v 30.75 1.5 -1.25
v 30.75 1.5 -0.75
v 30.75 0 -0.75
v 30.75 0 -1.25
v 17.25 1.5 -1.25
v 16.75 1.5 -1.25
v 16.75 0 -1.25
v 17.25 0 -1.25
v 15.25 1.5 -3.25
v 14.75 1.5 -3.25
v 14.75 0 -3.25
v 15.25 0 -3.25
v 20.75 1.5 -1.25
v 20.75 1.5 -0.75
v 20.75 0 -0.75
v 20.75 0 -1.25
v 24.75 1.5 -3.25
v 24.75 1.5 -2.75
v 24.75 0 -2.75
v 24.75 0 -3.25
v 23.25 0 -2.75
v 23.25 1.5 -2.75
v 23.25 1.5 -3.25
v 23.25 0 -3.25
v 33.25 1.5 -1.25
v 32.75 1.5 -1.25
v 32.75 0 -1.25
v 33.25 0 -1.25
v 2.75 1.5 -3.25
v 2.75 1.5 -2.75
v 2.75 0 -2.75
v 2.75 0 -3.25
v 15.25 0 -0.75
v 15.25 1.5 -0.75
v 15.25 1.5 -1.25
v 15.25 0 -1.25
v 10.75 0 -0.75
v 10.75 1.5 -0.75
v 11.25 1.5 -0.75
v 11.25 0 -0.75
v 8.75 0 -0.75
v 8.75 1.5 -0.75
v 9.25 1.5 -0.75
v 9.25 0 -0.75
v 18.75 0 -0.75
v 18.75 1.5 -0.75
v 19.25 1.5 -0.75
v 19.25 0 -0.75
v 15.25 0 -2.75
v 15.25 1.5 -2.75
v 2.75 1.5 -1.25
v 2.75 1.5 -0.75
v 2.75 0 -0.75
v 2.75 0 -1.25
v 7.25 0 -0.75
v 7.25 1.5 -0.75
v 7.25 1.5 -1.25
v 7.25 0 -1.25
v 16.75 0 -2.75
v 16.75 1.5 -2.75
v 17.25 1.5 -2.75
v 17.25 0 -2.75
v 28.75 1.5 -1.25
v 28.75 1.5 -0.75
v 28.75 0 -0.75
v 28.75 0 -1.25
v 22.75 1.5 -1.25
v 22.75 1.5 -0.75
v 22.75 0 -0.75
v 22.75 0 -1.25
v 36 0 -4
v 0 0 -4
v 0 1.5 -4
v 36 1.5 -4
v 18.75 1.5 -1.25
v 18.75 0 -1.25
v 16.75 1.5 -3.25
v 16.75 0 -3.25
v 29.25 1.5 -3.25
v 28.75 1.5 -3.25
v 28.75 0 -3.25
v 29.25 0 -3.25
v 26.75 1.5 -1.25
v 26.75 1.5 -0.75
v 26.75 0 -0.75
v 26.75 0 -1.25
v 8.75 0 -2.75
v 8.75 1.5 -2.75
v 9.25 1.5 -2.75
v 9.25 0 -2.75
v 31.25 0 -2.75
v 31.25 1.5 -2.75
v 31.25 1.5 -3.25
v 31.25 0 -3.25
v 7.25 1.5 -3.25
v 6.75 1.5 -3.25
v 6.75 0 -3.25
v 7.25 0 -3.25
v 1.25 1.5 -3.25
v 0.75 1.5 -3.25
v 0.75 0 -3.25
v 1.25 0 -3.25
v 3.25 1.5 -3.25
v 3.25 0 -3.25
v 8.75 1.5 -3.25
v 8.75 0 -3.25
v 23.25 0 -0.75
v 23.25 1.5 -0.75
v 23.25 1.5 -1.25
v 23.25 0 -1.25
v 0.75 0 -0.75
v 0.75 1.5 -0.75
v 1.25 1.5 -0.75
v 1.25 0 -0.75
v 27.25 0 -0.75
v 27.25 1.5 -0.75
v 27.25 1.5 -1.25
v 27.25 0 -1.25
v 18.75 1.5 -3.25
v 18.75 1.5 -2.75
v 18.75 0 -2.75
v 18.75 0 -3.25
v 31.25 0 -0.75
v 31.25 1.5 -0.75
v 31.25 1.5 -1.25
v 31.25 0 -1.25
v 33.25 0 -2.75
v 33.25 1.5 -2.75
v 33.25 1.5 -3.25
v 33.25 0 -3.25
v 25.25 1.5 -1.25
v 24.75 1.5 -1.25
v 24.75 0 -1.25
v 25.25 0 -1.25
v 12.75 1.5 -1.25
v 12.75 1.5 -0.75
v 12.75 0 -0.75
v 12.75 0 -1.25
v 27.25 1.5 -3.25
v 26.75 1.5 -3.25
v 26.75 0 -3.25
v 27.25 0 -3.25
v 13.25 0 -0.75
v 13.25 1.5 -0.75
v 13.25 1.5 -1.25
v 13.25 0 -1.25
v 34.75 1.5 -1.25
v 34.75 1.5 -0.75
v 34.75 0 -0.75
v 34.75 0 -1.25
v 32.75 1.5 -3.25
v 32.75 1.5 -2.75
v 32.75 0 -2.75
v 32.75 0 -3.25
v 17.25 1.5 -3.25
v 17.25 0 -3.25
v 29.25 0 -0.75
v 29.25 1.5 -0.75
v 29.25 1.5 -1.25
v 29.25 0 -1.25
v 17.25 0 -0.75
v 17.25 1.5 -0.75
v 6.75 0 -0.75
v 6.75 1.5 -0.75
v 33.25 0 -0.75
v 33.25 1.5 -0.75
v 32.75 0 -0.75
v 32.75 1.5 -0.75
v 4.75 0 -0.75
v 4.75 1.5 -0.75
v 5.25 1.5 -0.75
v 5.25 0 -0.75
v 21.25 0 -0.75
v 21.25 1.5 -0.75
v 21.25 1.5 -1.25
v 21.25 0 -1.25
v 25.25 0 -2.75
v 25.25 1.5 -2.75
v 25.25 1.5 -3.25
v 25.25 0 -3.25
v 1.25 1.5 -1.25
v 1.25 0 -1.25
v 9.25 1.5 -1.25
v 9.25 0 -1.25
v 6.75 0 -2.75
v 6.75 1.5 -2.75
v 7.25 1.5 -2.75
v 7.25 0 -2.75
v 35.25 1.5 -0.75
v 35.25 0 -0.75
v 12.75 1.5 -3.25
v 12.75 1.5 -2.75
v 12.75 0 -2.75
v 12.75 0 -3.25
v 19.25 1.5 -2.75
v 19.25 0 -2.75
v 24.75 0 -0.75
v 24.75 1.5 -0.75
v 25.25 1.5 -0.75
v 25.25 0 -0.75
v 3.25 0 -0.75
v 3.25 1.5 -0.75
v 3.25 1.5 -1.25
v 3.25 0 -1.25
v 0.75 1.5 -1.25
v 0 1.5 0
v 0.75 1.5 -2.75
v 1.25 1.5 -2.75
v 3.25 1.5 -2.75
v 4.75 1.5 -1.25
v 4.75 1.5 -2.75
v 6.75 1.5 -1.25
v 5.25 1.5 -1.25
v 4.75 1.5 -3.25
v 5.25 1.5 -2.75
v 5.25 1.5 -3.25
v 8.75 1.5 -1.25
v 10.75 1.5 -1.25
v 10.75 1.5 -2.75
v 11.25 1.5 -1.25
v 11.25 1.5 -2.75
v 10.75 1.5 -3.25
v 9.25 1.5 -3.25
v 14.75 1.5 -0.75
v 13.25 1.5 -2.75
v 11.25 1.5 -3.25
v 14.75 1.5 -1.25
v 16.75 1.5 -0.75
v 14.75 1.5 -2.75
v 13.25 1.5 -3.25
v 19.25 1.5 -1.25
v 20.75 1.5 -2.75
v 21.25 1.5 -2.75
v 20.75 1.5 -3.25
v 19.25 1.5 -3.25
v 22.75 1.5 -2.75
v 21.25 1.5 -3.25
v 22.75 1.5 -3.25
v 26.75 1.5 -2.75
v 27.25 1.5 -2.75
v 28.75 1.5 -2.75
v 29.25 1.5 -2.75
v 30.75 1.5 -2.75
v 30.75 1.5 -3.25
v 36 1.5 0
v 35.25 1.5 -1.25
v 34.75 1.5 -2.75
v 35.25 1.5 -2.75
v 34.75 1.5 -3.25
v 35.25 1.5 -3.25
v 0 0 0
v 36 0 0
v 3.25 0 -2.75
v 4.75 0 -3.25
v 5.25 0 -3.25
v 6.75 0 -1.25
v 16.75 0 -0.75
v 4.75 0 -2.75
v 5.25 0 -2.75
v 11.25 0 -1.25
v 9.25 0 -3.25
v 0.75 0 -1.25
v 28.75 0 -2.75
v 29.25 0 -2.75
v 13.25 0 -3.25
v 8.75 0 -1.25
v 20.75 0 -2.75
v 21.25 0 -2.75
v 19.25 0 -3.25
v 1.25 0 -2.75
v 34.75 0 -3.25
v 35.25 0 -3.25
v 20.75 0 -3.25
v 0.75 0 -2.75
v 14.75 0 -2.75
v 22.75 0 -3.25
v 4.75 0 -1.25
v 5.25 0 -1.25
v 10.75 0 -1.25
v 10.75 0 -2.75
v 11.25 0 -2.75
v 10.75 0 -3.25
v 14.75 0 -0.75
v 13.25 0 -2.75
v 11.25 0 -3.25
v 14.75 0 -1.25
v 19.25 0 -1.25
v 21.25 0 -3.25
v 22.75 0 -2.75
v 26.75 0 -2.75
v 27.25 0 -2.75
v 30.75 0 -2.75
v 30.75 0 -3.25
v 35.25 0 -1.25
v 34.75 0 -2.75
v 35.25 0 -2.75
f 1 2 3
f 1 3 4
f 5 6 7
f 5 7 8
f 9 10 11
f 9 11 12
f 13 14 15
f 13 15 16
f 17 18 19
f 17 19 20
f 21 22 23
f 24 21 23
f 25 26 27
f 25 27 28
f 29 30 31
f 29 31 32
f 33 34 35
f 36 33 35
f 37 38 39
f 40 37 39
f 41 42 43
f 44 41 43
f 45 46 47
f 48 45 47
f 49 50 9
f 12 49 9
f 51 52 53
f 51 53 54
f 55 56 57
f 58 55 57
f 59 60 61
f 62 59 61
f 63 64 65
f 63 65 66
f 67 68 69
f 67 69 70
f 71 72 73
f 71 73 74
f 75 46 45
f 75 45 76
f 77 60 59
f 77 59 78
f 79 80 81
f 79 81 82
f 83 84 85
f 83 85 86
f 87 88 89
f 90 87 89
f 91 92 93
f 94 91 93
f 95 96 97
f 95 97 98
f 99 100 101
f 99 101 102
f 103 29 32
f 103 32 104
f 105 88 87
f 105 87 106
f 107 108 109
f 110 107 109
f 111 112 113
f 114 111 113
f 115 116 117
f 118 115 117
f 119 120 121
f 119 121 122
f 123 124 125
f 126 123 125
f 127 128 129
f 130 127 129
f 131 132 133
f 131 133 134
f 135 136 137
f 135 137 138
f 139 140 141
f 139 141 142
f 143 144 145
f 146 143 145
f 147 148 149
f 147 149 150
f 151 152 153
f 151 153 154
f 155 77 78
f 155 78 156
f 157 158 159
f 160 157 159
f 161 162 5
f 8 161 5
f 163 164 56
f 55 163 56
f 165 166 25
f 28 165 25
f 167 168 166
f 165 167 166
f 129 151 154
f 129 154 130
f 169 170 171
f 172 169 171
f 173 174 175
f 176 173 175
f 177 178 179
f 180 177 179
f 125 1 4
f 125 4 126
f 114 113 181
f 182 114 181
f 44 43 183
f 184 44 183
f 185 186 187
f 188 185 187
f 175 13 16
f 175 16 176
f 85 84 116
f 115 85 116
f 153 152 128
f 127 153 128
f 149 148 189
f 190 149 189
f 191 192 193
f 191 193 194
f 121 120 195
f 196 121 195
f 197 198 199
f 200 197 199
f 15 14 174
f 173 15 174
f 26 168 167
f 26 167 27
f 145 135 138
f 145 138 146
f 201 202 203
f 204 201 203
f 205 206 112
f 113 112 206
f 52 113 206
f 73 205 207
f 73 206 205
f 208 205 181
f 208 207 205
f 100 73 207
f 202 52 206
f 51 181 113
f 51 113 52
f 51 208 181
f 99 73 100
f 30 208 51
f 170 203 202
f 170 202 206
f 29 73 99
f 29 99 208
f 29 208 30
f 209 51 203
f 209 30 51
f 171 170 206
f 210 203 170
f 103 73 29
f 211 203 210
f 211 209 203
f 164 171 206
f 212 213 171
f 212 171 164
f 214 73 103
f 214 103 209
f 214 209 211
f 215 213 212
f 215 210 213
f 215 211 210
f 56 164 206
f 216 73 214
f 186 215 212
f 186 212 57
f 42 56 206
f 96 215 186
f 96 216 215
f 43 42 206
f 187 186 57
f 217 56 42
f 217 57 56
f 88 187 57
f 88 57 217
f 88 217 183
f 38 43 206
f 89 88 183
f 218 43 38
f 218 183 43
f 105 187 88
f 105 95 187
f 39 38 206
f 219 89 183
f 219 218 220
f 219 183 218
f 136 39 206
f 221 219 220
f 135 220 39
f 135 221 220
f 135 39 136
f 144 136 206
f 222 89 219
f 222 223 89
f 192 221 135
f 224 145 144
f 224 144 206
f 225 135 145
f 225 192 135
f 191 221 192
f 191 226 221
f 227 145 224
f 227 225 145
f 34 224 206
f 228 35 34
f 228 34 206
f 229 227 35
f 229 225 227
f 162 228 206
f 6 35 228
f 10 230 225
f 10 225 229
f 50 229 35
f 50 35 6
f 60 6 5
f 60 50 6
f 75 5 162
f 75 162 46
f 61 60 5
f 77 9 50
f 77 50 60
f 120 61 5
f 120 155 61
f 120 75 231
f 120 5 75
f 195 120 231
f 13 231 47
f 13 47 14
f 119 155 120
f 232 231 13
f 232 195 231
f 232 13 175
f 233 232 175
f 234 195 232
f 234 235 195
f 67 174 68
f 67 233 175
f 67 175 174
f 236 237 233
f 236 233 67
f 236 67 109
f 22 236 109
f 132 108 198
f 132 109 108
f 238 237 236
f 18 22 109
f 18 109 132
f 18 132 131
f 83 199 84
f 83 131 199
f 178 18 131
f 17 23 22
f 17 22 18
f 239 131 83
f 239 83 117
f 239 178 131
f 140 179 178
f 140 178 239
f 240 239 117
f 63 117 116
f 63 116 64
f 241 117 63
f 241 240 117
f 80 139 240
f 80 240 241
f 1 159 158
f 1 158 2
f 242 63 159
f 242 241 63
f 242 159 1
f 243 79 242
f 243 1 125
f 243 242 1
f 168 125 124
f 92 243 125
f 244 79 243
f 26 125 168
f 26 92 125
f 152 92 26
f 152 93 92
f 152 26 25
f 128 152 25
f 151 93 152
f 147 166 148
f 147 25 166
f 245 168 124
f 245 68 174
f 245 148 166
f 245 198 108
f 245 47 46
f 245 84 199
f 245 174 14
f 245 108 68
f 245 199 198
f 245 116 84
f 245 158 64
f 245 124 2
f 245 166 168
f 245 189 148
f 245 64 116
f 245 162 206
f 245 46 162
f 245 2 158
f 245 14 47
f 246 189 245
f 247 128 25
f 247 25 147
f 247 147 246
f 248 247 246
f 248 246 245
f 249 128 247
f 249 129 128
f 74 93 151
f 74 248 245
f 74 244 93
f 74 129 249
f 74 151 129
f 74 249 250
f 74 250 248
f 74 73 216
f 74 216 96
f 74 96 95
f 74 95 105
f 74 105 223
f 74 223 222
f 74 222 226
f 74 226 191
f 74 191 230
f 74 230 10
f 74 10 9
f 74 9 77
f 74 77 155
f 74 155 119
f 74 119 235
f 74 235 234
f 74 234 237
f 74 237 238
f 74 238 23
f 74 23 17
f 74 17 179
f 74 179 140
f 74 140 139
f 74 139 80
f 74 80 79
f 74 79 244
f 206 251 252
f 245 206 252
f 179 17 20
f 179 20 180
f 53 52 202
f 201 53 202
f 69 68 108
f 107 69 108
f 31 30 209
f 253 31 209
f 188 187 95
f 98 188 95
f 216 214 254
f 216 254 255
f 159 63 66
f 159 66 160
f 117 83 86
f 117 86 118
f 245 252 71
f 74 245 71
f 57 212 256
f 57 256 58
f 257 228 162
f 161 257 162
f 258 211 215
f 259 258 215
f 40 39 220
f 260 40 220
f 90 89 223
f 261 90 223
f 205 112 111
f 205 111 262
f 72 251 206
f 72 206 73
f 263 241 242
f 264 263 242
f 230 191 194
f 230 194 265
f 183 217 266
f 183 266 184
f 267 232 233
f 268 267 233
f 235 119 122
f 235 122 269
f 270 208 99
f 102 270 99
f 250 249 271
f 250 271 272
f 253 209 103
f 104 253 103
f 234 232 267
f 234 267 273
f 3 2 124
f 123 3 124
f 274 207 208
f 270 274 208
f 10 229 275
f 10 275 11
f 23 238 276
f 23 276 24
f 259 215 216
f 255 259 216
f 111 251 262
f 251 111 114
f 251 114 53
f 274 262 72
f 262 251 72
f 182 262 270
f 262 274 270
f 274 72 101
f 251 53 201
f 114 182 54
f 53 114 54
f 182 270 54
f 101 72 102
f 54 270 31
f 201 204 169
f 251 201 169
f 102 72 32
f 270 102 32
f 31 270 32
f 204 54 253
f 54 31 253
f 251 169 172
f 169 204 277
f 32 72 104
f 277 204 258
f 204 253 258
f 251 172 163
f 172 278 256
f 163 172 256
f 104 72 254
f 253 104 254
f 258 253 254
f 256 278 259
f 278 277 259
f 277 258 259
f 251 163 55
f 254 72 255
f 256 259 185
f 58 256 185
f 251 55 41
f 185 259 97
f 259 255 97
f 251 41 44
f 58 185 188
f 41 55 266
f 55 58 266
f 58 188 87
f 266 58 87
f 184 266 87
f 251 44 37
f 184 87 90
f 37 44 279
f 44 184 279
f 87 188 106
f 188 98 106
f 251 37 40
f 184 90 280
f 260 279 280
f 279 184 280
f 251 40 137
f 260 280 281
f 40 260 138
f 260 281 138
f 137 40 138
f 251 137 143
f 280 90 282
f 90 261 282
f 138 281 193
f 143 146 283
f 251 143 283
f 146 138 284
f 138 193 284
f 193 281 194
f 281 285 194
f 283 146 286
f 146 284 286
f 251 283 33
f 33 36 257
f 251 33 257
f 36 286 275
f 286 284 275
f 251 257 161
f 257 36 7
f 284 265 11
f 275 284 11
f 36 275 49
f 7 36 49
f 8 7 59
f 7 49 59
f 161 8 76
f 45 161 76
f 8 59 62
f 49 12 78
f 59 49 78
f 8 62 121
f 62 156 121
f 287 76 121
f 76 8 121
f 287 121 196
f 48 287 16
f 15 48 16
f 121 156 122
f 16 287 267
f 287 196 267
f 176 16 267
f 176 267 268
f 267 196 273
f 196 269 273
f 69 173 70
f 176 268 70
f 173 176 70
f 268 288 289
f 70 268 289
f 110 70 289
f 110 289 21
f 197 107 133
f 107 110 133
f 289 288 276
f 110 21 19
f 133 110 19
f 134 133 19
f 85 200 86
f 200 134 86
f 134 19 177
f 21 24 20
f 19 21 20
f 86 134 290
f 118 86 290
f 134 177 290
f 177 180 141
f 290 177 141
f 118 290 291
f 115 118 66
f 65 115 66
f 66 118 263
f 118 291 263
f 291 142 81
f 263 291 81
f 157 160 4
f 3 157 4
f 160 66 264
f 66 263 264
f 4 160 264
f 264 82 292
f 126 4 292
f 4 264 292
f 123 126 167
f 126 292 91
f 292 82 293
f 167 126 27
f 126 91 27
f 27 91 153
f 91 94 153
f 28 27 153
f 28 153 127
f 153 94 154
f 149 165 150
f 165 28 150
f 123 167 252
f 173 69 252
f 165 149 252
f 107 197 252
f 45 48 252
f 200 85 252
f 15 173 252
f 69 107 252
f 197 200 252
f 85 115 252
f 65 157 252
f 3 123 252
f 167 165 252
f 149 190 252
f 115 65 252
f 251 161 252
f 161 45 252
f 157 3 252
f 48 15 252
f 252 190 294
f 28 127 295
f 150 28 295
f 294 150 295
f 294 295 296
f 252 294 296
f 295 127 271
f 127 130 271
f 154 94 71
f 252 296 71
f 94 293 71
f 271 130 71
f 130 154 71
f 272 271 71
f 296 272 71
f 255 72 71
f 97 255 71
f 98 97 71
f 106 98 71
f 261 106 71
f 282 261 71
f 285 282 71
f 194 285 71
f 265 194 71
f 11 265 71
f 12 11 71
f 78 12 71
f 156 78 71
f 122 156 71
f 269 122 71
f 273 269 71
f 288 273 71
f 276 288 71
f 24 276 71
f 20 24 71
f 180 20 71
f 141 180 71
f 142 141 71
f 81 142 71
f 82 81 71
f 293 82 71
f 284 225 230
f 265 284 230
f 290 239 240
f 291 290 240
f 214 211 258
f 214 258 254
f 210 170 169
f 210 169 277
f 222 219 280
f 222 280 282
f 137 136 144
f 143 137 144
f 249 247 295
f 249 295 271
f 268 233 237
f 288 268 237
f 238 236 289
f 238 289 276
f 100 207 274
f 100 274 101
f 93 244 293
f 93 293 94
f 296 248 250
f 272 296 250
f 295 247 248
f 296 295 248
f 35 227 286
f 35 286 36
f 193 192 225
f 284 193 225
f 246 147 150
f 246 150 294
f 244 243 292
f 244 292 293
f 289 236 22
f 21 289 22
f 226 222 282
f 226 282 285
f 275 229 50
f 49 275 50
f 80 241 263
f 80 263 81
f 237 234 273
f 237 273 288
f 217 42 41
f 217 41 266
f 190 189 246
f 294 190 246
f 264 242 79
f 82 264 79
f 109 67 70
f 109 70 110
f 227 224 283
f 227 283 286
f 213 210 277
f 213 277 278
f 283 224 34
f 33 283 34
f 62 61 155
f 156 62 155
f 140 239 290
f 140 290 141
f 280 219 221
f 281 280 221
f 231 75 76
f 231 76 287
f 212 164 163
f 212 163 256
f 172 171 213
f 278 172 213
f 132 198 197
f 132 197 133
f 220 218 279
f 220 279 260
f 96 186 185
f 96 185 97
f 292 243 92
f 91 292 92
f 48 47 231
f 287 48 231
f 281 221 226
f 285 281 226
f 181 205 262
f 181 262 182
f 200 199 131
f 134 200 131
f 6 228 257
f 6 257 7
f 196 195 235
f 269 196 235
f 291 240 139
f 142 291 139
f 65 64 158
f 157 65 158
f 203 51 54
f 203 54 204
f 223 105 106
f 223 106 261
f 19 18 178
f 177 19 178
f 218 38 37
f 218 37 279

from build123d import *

# Parameters (mm, degrees)
SKETCH1_W           = 36
SKETCH1_H           = 4
BOSS_EXTRUDE1_DEPTH = 1.5
SKETCH2_W           = 0.5
SKETCH2_H           = 0.5
CUT_EXTRUDE1_DEPTH  = 2


with BuildPart() as part:
    # Sketch1 → Boss-Extrude1 (new body)
    with BuildSketch(Plane(origin=(0, 0, 0), x_dir=(1, 0, 0), z_dir=(0, 1, 0))):
        with Locations((18, 2)):
            Rectangle(SKETCH1_W, SKETCH1_H)
    extrude(amount=BOSS_EXTRUDE1_DEPTH)

    # Sketch2 → Cut-Extrude1 (cut)
    with BuildSketch(Plane(origin=(0, 1.5, 0), x_dir=(1, 0, 0), z_dir=(0, 1, 0))):
        with Locations((3, 3)):
            Rectangle(SKETCH2_W, SKETCH2_H)
        with Locations((1, 3)):
            Rectangle(SKETCH2_W, SKETCH2_H)
        with Locations((5, 3)):
            Rectangle(SKETCH2_W, SKETCH2_H)
        with Locations((7, 3)):
            Rectangle(SKETCH2_W, SKETCH2_H)
        with Locations((9, 3)):
            Rectangle(SKETCH2_W, SKETCH2_H)
        with Locations((11, 3)):
            Rectangle(SKETCH2_W, SKETCH2_H)
        with Locations((13, 3)):
            Rectangle(SKETCH2_W, SKETCH2_H)
        with Locations((15, 3)):
            Rectangle(SKETCH2_W, SKETCH2_H)
        with Locations((17, 3)):
            Rectangle(SKETCH2_W, SKETCH2_H)
        with Locations((19, 3)):
            Rectangle(SKETCH2_W, SKETCH2_H)
        with Locations((21, 3)):
            Rectangle(SKETCH2_W, SKETCH2_H)
        with Locations((23, 3)):
            Rectangle(SKETCH2_W, SKETCH2_H)
        with Locations((25, 3)):
            Rectangle(SKETCH2_W, SKETCH2_H)
        with Locations((27, 3)):
            Rectangle(SKETCH2_W, SKETCH2_H)
        with Locations((29, 3)):
            Rectangle(SKETCH2_W, SKETCH2_H)
        with Locations((31, 3)):
            Rectangle(SKETCH2_W, SKETCH2_H)
        with Locations((33, 3)):
            Rectangle(SKETCH2_W, SKETCH2_H)
        with Locations((35, 3)):
            Rectangle(SKETCH2_W, SKETCH2_H)
        with Locations((1, 1)):
            Rectangle(SKETCH2_W, SKETCH2_H)
        with Locations((3, 1)):
            Rectangle(SKETCH2_W, SKETCH2_H)
        with Locations((5, 1)):
            Rectangle(SKETCH2_W, SKETCH2_H)
        with Locations((7, 1)):
            Rectangle(SKETCH2_W, SKETCH2_H)
        with Locations((9, 1)):
            Rectangle(SKETCH2_W, SKETCH2_H)
        with Locations((11, 1)):
            Rectangle(SKETCH2_W, SKETCH2_H)
        with Locations((13, 1)):
            Rectangle(SKETCH2_W, SKETCH2_H)
        with Locations((15, 1)):
            Rectangle(SKETCH2_W, SKETCH2_H)
        with Locations((17, 1)):
            Rectangle(SKETCH2_W, SKETCH2_H)
        with Locations((19, 1)):
            Rectangle(SKETCH2_W, SKETCH2_H)
        with Locations((21, 1)):
            Rectangle(SKETCH2_W, SKETCH2_H)
        with Locations((23, 1)):
            Rectangle(SKETCH2_W, SKETCH2_H)
        with Locations((25, 1)):
            Rectangle(SKETCH2_W, SKETCH2_H)
        with Locations((27, 1)):
            Rectangle(SKETCH2_W, SKETCH2_H)
        with Locations((29, 1)):
            Rectangle(SKETCH2_W, SKETCH2_H)
        with Locations((31, 1)):
            Rectangle(SKETCH2_W, SKETCH2_H)
        with Locations((33, 1)):
            Rectangle(SKETCH2_W, SKETCH2_H)
        with Locations((35, 1)):
            Rectangle(SKETCH2_W, SKETCH2_H)
    extrude(amount=-CUT_EXTRUDE1_DEPTH, mode=Mode.SUBTRACT)


solid = part.part
